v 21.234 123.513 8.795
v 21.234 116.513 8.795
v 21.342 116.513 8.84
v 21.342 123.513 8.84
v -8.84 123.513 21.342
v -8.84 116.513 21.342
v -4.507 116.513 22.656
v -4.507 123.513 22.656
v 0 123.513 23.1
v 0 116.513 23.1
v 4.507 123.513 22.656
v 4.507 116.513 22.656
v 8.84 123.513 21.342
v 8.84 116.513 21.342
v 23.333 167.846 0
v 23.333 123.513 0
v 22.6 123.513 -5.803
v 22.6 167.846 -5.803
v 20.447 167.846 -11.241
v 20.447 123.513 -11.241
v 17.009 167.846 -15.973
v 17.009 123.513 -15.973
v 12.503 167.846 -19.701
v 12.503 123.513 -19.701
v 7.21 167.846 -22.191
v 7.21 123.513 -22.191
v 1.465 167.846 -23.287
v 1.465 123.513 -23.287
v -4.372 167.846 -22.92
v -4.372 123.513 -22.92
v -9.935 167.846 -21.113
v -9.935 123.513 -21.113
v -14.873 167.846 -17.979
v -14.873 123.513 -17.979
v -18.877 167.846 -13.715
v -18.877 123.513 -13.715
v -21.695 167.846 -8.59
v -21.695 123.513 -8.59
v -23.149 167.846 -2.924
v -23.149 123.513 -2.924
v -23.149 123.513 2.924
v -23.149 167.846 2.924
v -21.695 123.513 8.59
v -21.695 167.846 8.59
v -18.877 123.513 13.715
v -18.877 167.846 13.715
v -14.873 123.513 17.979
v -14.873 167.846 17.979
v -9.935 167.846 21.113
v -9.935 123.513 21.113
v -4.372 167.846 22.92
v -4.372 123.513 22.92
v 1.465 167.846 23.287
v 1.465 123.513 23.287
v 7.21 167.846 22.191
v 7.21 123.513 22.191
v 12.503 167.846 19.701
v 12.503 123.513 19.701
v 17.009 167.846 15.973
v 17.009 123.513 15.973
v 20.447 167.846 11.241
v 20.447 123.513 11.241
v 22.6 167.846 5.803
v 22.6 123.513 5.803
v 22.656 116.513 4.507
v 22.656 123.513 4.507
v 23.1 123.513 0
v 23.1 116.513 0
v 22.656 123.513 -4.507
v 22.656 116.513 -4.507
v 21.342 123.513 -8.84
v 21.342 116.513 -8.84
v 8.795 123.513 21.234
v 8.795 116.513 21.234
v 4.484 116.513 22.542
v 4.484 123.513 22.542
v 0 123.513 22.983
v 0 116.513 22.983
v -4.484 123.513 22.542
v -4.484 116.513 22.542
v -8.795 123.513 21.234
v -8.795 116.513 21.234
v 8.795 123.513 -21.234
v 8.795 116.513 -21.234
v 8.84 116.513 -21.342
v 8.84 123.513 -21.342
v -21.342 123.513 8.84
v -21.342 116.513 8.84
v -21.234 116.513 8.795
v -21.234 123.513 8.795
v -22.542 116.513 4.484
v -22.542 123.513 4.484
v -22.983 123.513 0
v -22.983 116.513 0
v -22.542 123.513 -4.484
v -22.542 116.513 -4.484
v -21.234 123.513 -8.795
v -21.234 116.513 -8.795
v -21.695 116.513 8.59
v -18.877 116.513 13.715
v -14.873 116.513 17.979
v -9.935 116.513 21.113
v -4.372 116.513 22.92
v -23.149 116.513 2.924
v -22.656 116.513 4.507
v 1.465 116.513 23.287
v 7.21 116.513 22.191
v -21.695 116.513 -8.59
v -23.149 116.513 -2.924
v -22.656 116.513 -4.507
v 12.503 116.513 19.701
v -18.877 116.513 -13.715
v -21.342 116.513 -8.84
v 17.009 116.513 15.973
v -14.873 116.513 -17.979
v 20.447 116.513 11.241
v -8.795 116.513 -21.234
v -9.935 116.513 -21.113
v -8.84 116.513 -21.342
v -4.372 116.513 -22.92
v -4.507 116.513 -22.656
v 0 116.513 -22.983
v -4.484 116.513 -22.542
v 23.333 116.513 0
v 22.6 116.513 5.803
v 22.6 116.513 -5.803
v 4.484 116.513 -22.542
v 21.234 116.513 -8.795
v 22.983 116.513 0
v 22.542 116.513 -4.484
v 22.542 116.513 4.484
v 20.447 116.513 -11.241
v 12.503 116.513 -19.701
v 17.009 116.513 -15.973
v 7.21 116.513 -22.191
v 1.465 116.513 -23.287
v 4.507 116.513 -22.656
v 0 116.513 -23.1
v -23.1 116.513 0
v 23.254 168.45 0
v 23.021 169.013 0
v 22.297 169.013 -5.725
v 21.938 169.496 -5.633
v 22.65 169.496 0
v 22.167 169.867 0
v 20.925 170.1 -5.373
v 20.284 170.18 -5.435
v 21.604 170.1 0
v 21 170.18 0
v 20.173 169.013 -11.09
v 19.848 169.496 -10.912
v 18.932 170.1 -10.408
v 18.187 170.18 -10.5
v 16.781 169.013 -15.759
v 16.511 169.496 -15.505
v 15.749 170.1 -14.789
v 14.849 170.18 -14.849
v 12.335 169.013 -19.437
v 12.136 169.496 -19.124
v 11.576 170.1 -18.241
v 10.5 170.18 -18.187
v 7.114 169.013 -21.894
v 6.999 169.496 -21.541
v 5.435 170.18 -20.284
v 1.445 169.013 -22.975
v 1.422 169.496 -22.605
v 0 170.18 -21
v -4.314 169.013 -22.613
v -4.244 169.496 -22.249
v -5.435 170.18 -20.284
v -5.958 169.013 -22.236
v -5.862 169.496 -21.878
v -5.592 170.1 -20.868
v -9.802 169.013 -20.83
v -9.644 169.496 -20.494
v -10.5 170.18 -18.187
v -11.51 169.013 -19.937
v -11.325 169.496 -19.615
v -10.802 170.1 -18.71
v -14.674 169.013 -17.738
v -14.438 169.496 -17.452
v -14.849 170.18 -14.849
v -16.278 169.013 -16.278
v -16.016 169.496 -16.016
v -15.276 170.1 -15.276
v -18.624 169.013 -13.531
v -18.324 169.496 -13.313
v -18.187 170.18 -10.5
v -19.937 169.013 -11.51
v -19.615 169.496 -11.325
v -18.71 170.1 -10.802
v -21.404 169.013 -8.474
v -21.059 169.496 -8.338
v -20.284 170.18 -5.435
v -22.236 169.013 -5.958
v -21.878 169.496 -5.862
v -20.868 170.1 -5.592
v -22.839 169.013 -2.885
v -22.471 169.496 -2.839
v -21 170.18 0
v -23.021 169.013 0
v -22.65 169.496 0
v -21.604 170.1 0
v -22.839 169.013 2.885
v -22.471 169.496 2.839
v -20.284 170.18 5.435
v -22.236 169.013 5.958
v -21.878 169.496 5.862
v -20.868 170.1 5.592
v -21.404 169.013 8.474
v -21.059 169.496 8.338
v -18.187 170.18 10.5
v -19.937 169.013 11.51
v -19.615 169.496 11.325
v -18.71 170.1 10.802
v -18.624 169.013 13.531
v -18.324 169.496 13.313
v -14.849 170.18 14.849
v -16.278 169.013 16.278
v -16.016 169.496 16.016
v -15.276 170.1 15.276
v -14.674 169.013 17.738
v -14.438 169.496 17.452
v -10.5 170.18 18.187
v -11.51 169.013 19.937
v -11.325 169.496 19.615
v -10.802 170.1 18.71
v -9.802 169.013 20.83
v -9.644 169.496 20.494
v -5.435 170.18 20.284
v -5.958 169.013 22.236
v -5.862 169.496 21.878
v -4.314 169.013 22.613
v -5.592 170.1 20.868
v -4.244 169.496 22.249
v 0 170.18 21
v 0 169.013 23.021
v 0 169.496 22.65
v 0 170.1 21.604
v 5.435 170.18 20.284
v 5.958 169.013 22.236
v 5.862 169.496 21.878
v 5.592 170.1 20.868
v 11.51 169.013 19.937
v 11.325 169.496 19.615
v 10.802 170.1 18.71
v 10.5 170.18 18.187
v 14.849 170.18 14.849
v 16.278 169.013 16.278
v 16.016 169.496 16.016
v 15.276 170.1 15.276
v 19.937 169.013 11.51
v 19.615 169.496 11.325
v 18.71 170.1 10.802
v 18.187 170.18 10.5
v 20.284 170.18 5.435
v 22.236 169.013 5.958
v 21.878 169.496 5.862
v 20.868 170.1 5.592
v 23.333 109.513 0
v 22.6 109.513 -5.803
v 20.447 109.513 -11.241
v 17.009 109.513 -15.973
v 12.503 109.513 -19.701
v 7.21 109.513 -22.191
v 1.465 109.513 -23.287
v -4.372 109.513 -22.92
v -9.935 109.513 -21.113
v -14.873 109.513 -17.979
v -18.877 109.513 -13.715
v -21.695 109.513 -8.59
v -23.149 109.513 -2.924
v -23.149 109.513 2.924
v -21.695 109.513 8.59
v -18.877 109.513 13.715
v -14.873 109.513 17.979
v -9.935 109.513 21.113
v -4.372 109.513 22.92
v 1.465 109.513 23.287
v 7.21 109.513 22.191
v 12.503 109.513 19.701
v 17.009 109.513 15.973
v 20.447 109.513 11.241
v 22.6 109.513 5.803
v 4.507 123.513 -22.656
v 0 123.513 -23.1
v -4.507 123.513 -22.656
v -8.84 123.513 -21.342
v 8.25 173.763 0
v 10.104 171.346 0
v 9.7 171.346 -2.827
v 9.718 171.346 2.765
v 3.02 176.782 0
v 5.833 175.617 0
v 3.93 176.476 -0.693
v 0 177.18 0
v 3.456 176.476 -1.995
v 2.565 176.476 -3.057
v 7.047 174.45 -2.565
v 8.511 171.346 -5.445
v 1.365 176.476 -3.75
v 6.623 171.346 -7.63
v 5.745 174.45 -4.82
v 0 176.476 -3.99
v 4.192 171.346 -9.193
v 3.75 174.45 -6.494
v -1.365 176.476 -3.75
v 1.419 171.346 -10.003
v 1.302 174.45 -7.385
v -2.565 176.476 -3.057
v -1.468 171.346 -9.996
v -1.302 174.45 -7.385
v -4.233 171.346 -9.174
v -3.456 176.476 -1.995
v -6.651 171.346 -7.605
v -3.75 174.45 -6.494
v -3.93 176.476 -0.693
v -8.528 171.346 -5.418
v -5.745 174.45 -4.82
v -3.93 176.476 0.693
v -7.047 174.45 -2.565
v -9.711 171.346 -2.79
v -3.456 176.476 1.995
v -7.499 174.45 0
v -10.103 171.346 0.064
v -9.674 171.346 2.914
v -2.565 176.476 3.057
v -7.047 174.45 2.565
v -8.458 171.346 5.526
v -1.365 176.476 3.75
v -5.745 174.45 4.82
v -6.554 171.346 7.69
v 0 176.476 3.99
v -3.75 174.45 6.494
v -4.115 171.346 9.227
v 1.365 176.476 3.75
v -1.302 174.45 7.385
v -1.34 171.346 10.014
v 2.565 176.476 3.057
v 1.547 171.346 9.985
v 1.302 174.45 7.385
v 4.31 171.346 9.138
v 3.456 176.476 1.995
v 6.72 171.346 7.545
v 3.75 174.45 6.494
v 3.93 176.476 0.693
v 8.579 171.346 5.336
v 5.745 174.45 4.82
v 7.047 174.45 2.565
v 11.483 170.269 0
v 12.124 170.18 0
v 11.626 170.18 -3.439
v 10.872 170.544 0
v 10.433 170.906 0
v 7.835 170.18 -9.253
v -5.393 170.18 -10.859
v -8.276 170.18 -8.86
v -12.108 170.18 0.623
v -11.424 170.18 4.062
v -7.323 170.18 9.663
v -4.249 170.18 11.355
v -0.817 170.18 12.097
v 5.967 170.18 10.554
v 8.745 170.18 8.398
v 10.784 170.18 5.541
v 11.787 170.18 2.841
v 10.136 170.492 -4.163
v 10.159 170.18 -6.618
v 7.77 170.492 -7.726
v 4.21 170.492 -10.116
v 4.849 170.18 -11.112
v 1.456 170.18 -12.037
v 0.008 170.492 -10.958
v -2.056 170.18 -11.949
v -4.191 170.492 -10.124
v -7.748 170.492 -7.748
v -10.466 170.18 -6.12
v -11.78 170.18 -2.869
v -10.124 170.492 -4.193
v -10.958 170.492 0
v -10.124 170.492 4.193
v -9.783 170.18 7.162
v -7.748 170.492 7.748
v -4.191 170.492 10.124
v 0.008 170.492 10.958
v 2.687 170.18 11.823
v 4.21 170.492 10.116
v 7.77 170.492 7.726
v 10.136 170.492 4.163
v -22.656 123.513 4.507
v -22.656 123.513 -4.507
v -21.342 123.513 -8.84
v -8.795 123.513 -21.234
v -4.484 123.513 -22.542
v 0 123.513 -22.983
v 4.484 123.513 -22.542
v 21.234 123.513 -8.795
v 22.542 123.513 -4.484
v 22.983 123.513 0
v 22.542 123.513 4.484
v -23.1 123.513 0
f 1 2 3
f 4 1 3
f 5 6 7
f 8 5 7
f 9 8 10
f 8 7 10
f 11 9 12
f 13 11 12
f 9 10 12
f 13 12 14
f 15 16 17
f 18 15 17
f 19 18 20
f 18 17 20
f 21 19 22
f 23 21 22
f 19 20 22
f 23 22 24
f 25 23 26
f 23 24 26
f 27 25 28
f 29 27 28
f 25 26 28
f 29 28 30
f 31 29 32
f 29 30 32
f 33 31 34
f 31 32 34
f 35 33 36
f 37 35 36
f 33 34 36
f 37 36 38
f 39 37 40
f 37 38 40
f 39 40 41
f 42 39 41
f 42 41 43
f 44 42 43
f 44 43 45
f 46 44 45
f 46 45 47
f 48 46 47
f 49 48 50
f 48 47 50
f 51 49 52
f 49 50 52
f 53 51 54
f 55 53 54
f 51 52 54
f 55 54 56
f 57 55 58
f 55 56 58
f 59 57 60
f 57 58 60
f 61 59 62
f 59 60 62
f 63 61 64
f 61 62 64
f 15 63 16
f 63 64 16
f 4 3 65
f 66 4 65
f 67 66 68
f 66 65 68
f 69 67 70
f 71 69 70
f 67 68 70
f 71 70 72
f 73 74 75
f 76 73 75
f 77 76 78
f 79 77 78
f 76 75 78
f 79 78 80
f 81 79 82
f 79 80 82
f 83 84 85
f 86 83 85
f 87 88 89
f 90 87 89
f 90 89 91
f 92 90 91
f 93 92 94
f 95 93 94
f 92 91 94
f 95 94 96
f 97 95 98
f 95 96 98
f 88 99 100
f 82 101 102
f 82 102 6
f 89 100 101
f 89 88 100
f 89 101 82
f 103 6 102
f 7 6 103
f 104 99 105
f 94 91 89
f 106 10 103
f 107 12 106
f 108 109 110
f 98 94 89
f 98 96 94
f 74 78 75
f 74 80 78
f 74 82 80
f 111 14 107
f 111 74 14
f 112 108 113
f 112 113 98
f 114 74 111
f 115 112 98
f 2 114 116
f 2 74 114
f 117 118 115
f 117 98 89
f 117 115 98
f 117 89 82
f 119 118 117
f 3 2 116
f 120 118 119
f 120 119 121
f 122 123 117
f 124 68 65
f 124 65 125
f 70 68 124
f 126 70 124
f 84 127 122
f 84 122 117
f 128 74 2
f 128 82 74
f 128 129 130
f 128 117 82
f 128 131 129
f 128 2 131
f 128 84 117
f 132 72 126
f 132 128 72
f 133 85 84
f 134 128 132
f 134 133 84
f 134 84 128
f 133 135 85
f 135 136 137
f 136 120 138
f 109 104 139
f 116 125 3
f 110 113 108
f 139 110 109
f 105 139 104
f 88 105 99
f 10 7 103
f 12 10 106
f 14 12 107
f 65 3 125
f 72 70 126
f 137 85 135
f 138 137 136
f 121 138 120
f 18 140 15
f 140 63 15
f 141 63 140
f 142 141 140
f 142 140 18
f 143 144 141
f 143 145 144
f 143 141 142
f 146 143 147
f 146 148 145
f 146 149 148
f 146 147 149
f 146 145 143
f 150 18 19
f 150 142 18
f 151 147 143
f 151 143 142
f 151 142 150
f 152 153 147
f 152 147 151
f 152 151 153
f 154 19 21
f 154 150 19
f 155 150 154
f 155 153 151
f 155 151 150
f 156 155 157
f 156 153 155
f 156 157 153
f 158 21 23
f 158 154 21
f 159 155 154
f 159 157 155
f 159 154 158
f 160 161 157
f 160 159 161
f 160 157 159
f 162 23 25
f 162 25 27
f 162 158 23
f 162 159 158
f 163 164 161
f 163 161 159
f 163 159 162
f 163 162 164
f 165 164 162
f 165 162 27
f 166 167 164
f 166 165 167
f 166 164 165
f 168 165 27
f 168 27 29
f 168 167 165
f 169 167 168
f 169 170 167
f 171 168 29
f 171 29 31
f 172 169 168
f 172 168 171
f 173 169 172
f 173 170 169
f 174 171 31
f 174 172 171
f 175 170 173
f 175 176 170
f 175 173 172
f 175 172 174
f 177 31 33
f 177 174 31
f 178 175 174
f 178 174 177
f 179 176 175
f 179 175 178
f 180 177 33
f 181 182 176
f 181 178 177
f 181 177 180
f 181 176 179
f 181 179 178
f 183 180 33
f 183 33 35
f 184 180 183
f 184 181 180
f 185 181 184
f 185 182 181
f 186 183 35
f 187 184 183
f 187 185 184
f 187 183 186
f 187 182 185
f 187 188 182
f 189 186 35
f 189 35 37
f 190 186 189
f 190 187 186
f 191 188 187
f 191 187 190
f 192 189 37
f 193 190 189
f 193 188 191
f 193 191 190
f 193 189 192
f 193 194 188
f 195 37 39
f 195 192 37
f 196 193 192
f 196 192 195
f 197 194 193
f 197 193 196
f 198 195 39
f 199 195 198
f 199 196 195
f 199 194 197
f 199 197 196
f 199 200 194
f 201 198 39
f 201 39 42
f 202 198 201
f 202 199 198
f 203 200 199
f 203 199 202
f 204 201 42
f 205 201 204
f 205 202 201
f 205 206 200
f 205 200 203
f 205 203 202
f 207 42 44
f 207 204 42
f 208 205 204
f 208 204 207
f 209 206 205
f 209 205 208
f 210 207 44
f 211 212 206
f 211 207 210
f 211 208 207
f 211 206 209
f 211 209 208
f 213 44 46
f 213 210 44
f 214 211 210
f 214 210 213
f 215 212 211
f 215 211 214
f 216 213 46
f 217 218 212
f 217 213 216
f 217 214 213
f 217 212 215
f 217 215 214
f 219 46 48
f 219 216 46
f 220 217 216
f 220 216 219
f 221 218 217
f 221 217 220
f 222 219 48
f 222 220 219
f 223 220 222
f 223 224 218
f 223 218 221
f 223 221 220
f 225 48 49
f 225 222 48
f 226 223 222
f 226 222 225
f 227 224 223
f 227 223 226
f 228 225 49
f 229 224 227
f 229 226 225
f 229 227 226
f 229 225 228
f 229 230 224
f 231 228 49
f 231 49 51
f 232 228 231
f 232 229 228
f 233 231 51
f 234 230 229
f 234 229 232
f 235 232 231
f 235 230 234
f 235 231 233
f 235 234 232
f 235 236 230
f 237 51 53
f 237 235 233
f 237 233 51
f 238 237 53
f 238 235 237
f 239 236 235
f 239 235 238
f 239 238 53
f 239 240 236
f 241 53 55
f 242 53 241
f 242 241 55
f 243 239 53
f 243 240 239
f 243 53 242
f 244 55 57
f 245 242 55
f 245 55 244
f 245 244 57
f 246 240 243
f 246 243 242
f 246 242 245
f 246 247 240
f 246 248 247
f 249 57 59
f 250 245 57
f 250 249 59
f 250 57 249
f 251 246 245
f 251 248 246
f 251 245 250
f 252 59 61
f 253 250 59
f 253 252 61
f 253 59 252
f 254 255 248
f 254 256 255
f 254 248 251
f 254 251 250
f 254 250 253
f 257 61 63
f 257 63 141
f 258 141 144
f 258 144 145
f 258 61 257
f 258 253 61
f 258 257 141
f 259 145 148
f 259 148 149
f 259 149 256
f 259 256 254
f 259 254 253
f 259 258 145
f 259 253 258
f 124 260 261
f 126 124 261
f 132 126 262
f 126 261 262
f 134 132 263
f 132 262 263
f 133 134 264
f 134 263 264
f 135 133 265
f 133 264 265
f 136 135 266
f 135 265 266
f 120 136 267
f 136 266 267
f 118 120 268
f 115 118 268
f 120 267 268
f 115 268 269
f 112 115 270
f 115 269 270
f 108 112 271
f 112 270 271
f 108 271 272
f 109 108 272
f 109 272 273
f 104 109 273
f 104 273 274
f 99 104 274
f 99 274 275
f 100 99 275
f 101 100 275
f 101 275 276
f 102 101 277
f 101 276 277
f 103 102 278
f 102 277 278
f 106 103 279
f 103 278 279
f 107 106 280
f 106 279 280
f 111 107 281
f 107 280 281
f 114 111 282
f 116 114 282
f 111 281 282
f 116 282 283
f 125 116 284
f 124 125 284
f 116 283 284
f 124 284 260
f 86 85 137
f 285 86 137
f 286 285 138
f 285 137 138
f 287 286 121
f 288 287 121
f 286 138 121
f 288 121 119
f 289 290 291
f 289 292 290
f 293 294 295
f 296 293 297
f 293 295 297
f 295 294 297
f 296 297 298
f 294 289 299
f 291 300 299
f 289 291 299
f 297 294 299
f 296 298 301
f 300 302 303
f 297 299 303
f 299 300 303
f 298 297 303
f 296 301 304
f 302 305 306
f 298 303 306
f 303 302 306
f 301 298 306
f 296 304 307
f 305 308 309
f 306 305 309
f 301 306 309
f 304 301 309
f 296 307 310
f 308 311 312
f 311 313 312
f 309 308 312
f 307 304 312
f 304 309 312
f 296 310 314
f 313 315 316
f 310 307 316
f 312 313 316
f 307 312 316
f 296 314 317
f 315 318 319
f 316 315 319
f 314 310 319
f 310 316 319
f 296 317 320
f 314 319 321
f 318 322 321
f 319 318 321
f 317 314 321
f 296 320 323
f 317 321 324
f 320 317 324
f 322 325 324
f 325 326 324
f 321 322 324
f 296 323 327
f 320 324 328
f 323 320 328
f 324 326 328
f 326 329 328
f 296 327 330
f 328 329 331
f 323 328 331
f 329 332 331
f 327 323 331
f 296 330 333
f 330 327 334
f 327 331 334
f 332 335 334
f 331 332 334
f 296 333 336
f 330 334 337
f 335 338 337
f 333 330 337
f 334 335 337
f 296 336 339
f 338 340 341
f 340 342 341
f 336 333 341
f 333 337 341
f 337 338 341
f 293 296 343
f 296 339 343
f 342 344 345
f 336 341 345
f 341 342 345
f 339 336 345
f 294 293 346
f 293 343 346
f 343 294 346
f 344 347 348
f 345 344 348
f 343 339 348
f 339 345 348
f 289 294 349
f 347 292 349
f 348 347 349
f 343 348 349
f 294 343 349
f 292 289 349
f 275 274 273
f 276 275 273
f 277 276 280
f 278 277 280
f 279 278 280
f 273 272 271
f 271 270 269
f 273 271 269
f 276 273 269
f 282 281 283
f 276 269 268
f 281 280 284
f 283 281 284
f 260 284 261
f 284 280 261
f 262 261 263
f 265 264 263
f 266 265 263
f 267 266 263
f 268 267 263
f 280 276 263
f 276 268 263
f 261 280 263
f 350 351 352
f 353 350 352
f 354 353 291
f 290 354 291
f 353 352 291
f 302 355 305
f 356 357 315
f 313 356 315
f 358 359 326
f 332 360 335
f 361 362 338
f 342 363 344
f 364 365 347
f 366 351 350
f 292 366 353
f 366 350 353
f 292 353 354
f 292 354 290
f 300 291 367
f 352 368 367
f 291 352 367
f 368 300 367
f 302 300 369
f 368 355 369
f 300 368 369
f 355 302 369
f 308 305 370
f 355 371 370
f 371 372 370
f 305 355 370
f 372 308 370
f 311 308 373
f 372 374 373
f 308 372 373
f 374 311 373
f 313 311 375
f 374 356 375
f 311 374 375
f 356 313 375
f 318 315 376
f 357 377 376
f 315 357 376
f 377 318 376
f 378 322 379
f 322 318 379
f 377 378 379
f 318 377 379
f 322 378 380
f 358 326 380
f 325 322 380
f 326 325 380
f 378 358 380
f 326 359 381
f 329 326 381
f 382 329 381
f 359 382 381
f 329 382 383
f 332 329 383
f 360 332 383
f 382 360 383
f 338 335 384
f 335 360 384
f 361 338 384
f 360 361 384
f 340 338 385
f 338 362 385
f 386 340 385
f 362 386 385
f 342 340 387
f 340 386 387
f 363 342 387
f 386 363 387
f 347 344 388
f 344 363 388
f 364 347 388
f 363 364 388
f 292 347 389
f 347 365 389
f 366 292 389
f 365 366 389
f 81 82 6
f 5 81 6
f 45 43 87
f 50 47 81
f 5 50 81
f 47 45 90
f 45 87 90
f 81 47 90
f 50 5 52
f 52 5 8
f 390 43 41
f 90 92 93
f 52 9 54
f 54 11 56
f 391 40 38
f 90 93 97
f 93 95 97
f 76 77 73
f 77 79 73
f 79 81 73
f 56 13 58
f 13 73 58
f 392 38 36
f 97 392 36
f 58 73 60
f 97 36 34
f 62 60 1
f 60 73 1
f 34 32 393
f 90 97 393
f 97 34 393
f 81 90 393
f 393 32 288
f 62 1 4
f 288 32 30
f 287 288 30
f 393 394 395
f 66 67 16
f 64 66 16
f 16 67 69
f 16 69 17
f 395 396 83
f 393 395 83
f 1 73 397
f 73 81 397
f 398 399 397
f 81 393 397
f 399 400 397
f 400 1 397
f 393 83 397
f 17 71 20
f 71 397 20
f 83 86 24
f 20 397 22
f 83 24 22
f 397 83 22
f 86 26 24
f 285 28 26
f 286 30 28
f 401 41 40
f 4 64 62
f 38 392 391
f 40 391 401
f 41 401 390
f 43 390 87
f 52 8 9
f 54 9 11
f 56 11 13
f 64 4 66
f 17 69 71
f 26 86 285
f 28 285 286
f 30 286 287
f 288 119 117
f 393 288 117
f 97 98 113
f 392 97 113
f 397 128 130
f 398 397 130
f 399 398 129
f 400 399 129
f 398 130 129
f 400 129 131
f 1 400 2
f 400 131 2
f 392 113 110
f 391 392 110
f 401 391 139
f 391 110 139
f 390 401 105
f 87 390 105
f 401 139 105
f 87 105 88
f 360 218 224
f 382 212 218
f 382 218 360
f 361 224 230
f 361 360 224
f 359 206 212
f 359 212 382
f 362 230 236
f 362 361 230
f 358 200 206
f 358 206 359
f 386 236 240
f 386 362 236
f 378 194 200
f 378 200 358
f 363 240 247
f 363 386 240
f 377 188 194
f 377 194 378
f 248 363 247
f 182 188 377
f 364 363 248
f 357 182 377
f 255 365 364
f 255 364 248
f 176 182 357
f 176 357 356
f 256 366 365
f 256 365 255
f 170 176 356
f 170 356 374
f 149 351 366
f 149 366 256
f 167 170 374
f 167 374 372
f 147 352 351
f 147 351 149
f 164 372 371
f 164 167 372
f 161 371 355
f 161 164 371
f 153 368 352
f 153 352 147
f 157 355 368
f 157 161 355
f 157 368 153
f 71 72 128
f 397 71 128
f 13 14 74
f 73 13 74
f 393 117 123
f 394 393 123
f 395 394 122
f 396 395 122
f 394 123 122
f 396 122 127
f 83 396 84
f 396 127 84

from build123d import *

# Parameters (mm, degrees)
SKETCH1_R           = 100
BOSS_EXTRUDE1_DEPTH = 30
BOSS_EXTRUDE2_DEPTH = 30
SKETCH3_R           = 100
BOSS_EXTRUDE3_DEPTH = 200
FILLET1_R           = 10
SCALE1_SCALE        = 0.233333333


with BuildPart() as part:
    # Sketch1 → Boss-Extrude1 (new body)
    with BuildSketch(Plane(origin=(0, 0, 0), x_dir=(1, 0, 0), z_dir=(0, 1, 0))):
        Circle(SKETCH1_R)
    extrude(amount=BOSS_EXTRUDE1_DEPTH)

    # Sketch2 → Boss-Extrude2 (add)
    with BuildSketch(Plane(origin=(0, 30, 0), x_dir=(1, 0, 0), z_dir=(0, 1, 0))):
        with BuildLine():
            Line((91.464073719, 37.885659804), (91.002133952, 37.694318088))
            ThreePointArc((91.002133952, 37.694318088), (98.5, 0), (91.002133952, -37.694318088))
            Line((91.002133952, -37.694318088), (91.464073719, -37.885659804))
            ThreePointArc((91.464073719, -37.885659804), (99, 0), (91.464073719, 37.885659804))
        make_face()
        with BuildLine():
            Line((37.885659804, -91.464073719), (37.694318088, -91.002133952))
            ThreePointArc((37.694318088, -91.002133952), (0, -98.5), (-37.694318088, -91.002133952))
            Line((-37.694318088, -91.002133952), (-37.885659804, -91.464073719))
            ThreePointArc((-37.885659804, -91.464073719), (0, -99), (37.885659804, -91.464073719))
        make_face()
        with BuildLine():
            Line((-91.464073719, -37.885659804), (-91.002133952, -37.694318088))
            ThreePointArc((-91.002133952, -37.694318088), (-98.5, 0), (-91.002133952, 37.694318088))
            Line((-91.002133952, 37.694318088), (-91.464073719, 37.885659804))
            ThreePointArc((-91.464073719, 37.885659804), (-99, 0), (-91.464073719, -37.885659804))
        make_face()
        with BuildLine():
            Line((-37.885659804, 91.464073719), (-37.694318088, 91.002133952))
            ThreePointArc((-37.694318088, 91.002133952), (0, 98.5), (37.694318088, 91.002133952))
            Line((37.694318088, 91.002133952), (37.885659804, 91.464073719))
            ThreePointArc((37.885659804, 91.464073719), (0, 99), (-37.885659804, 91.464073719))
        make_face()
    extrude(amount=BOSS_EXTRUDE2_DEPTH)

    # Sketch3 → Boss-Extrude3 (add)
    with BuildSketch(Plane(origin=(0, 60, 0), x_dir=(1, 0, 0), z_dir=(0, 1, 0))):
        Circle(SKETCH3_R)
    extrude(amount=BOSS_EXTRUDE3_DEPTH)

    # Sketch5 → Revolve1 (revolve)
    with BuildSketch(Plane.XY):
        with BuildLine():
            Line((45.82575695, 260), (0, 260))
            Line((0, 260), (0, 290))
            ThreePointArc((0, 290), (27.386127875, 281.833001327), (45.82575695, 260))
        make_face()
    revolve(axis=Axis((0, 115.728499237, 0), (0, 1, 0)))

    # Fillet1
    fillet1_edges = [part.edges().sort_by_distance(p)[0] for p in [
        (-100, 260, 0),
        (-45.82575695, 260, 0),
    ]]
    fillet(fillet1_edges, radius=FILLET1_R)


with BuildPart() as part_1:
    # Scale1: scaled about (-2.1e-08, 142.843087279, 0)
    add(part.part.scale(SCALE1_SCALE).moved(Location((-1.6e-08, 109.513033581, 0))))


solid = part_1.part
